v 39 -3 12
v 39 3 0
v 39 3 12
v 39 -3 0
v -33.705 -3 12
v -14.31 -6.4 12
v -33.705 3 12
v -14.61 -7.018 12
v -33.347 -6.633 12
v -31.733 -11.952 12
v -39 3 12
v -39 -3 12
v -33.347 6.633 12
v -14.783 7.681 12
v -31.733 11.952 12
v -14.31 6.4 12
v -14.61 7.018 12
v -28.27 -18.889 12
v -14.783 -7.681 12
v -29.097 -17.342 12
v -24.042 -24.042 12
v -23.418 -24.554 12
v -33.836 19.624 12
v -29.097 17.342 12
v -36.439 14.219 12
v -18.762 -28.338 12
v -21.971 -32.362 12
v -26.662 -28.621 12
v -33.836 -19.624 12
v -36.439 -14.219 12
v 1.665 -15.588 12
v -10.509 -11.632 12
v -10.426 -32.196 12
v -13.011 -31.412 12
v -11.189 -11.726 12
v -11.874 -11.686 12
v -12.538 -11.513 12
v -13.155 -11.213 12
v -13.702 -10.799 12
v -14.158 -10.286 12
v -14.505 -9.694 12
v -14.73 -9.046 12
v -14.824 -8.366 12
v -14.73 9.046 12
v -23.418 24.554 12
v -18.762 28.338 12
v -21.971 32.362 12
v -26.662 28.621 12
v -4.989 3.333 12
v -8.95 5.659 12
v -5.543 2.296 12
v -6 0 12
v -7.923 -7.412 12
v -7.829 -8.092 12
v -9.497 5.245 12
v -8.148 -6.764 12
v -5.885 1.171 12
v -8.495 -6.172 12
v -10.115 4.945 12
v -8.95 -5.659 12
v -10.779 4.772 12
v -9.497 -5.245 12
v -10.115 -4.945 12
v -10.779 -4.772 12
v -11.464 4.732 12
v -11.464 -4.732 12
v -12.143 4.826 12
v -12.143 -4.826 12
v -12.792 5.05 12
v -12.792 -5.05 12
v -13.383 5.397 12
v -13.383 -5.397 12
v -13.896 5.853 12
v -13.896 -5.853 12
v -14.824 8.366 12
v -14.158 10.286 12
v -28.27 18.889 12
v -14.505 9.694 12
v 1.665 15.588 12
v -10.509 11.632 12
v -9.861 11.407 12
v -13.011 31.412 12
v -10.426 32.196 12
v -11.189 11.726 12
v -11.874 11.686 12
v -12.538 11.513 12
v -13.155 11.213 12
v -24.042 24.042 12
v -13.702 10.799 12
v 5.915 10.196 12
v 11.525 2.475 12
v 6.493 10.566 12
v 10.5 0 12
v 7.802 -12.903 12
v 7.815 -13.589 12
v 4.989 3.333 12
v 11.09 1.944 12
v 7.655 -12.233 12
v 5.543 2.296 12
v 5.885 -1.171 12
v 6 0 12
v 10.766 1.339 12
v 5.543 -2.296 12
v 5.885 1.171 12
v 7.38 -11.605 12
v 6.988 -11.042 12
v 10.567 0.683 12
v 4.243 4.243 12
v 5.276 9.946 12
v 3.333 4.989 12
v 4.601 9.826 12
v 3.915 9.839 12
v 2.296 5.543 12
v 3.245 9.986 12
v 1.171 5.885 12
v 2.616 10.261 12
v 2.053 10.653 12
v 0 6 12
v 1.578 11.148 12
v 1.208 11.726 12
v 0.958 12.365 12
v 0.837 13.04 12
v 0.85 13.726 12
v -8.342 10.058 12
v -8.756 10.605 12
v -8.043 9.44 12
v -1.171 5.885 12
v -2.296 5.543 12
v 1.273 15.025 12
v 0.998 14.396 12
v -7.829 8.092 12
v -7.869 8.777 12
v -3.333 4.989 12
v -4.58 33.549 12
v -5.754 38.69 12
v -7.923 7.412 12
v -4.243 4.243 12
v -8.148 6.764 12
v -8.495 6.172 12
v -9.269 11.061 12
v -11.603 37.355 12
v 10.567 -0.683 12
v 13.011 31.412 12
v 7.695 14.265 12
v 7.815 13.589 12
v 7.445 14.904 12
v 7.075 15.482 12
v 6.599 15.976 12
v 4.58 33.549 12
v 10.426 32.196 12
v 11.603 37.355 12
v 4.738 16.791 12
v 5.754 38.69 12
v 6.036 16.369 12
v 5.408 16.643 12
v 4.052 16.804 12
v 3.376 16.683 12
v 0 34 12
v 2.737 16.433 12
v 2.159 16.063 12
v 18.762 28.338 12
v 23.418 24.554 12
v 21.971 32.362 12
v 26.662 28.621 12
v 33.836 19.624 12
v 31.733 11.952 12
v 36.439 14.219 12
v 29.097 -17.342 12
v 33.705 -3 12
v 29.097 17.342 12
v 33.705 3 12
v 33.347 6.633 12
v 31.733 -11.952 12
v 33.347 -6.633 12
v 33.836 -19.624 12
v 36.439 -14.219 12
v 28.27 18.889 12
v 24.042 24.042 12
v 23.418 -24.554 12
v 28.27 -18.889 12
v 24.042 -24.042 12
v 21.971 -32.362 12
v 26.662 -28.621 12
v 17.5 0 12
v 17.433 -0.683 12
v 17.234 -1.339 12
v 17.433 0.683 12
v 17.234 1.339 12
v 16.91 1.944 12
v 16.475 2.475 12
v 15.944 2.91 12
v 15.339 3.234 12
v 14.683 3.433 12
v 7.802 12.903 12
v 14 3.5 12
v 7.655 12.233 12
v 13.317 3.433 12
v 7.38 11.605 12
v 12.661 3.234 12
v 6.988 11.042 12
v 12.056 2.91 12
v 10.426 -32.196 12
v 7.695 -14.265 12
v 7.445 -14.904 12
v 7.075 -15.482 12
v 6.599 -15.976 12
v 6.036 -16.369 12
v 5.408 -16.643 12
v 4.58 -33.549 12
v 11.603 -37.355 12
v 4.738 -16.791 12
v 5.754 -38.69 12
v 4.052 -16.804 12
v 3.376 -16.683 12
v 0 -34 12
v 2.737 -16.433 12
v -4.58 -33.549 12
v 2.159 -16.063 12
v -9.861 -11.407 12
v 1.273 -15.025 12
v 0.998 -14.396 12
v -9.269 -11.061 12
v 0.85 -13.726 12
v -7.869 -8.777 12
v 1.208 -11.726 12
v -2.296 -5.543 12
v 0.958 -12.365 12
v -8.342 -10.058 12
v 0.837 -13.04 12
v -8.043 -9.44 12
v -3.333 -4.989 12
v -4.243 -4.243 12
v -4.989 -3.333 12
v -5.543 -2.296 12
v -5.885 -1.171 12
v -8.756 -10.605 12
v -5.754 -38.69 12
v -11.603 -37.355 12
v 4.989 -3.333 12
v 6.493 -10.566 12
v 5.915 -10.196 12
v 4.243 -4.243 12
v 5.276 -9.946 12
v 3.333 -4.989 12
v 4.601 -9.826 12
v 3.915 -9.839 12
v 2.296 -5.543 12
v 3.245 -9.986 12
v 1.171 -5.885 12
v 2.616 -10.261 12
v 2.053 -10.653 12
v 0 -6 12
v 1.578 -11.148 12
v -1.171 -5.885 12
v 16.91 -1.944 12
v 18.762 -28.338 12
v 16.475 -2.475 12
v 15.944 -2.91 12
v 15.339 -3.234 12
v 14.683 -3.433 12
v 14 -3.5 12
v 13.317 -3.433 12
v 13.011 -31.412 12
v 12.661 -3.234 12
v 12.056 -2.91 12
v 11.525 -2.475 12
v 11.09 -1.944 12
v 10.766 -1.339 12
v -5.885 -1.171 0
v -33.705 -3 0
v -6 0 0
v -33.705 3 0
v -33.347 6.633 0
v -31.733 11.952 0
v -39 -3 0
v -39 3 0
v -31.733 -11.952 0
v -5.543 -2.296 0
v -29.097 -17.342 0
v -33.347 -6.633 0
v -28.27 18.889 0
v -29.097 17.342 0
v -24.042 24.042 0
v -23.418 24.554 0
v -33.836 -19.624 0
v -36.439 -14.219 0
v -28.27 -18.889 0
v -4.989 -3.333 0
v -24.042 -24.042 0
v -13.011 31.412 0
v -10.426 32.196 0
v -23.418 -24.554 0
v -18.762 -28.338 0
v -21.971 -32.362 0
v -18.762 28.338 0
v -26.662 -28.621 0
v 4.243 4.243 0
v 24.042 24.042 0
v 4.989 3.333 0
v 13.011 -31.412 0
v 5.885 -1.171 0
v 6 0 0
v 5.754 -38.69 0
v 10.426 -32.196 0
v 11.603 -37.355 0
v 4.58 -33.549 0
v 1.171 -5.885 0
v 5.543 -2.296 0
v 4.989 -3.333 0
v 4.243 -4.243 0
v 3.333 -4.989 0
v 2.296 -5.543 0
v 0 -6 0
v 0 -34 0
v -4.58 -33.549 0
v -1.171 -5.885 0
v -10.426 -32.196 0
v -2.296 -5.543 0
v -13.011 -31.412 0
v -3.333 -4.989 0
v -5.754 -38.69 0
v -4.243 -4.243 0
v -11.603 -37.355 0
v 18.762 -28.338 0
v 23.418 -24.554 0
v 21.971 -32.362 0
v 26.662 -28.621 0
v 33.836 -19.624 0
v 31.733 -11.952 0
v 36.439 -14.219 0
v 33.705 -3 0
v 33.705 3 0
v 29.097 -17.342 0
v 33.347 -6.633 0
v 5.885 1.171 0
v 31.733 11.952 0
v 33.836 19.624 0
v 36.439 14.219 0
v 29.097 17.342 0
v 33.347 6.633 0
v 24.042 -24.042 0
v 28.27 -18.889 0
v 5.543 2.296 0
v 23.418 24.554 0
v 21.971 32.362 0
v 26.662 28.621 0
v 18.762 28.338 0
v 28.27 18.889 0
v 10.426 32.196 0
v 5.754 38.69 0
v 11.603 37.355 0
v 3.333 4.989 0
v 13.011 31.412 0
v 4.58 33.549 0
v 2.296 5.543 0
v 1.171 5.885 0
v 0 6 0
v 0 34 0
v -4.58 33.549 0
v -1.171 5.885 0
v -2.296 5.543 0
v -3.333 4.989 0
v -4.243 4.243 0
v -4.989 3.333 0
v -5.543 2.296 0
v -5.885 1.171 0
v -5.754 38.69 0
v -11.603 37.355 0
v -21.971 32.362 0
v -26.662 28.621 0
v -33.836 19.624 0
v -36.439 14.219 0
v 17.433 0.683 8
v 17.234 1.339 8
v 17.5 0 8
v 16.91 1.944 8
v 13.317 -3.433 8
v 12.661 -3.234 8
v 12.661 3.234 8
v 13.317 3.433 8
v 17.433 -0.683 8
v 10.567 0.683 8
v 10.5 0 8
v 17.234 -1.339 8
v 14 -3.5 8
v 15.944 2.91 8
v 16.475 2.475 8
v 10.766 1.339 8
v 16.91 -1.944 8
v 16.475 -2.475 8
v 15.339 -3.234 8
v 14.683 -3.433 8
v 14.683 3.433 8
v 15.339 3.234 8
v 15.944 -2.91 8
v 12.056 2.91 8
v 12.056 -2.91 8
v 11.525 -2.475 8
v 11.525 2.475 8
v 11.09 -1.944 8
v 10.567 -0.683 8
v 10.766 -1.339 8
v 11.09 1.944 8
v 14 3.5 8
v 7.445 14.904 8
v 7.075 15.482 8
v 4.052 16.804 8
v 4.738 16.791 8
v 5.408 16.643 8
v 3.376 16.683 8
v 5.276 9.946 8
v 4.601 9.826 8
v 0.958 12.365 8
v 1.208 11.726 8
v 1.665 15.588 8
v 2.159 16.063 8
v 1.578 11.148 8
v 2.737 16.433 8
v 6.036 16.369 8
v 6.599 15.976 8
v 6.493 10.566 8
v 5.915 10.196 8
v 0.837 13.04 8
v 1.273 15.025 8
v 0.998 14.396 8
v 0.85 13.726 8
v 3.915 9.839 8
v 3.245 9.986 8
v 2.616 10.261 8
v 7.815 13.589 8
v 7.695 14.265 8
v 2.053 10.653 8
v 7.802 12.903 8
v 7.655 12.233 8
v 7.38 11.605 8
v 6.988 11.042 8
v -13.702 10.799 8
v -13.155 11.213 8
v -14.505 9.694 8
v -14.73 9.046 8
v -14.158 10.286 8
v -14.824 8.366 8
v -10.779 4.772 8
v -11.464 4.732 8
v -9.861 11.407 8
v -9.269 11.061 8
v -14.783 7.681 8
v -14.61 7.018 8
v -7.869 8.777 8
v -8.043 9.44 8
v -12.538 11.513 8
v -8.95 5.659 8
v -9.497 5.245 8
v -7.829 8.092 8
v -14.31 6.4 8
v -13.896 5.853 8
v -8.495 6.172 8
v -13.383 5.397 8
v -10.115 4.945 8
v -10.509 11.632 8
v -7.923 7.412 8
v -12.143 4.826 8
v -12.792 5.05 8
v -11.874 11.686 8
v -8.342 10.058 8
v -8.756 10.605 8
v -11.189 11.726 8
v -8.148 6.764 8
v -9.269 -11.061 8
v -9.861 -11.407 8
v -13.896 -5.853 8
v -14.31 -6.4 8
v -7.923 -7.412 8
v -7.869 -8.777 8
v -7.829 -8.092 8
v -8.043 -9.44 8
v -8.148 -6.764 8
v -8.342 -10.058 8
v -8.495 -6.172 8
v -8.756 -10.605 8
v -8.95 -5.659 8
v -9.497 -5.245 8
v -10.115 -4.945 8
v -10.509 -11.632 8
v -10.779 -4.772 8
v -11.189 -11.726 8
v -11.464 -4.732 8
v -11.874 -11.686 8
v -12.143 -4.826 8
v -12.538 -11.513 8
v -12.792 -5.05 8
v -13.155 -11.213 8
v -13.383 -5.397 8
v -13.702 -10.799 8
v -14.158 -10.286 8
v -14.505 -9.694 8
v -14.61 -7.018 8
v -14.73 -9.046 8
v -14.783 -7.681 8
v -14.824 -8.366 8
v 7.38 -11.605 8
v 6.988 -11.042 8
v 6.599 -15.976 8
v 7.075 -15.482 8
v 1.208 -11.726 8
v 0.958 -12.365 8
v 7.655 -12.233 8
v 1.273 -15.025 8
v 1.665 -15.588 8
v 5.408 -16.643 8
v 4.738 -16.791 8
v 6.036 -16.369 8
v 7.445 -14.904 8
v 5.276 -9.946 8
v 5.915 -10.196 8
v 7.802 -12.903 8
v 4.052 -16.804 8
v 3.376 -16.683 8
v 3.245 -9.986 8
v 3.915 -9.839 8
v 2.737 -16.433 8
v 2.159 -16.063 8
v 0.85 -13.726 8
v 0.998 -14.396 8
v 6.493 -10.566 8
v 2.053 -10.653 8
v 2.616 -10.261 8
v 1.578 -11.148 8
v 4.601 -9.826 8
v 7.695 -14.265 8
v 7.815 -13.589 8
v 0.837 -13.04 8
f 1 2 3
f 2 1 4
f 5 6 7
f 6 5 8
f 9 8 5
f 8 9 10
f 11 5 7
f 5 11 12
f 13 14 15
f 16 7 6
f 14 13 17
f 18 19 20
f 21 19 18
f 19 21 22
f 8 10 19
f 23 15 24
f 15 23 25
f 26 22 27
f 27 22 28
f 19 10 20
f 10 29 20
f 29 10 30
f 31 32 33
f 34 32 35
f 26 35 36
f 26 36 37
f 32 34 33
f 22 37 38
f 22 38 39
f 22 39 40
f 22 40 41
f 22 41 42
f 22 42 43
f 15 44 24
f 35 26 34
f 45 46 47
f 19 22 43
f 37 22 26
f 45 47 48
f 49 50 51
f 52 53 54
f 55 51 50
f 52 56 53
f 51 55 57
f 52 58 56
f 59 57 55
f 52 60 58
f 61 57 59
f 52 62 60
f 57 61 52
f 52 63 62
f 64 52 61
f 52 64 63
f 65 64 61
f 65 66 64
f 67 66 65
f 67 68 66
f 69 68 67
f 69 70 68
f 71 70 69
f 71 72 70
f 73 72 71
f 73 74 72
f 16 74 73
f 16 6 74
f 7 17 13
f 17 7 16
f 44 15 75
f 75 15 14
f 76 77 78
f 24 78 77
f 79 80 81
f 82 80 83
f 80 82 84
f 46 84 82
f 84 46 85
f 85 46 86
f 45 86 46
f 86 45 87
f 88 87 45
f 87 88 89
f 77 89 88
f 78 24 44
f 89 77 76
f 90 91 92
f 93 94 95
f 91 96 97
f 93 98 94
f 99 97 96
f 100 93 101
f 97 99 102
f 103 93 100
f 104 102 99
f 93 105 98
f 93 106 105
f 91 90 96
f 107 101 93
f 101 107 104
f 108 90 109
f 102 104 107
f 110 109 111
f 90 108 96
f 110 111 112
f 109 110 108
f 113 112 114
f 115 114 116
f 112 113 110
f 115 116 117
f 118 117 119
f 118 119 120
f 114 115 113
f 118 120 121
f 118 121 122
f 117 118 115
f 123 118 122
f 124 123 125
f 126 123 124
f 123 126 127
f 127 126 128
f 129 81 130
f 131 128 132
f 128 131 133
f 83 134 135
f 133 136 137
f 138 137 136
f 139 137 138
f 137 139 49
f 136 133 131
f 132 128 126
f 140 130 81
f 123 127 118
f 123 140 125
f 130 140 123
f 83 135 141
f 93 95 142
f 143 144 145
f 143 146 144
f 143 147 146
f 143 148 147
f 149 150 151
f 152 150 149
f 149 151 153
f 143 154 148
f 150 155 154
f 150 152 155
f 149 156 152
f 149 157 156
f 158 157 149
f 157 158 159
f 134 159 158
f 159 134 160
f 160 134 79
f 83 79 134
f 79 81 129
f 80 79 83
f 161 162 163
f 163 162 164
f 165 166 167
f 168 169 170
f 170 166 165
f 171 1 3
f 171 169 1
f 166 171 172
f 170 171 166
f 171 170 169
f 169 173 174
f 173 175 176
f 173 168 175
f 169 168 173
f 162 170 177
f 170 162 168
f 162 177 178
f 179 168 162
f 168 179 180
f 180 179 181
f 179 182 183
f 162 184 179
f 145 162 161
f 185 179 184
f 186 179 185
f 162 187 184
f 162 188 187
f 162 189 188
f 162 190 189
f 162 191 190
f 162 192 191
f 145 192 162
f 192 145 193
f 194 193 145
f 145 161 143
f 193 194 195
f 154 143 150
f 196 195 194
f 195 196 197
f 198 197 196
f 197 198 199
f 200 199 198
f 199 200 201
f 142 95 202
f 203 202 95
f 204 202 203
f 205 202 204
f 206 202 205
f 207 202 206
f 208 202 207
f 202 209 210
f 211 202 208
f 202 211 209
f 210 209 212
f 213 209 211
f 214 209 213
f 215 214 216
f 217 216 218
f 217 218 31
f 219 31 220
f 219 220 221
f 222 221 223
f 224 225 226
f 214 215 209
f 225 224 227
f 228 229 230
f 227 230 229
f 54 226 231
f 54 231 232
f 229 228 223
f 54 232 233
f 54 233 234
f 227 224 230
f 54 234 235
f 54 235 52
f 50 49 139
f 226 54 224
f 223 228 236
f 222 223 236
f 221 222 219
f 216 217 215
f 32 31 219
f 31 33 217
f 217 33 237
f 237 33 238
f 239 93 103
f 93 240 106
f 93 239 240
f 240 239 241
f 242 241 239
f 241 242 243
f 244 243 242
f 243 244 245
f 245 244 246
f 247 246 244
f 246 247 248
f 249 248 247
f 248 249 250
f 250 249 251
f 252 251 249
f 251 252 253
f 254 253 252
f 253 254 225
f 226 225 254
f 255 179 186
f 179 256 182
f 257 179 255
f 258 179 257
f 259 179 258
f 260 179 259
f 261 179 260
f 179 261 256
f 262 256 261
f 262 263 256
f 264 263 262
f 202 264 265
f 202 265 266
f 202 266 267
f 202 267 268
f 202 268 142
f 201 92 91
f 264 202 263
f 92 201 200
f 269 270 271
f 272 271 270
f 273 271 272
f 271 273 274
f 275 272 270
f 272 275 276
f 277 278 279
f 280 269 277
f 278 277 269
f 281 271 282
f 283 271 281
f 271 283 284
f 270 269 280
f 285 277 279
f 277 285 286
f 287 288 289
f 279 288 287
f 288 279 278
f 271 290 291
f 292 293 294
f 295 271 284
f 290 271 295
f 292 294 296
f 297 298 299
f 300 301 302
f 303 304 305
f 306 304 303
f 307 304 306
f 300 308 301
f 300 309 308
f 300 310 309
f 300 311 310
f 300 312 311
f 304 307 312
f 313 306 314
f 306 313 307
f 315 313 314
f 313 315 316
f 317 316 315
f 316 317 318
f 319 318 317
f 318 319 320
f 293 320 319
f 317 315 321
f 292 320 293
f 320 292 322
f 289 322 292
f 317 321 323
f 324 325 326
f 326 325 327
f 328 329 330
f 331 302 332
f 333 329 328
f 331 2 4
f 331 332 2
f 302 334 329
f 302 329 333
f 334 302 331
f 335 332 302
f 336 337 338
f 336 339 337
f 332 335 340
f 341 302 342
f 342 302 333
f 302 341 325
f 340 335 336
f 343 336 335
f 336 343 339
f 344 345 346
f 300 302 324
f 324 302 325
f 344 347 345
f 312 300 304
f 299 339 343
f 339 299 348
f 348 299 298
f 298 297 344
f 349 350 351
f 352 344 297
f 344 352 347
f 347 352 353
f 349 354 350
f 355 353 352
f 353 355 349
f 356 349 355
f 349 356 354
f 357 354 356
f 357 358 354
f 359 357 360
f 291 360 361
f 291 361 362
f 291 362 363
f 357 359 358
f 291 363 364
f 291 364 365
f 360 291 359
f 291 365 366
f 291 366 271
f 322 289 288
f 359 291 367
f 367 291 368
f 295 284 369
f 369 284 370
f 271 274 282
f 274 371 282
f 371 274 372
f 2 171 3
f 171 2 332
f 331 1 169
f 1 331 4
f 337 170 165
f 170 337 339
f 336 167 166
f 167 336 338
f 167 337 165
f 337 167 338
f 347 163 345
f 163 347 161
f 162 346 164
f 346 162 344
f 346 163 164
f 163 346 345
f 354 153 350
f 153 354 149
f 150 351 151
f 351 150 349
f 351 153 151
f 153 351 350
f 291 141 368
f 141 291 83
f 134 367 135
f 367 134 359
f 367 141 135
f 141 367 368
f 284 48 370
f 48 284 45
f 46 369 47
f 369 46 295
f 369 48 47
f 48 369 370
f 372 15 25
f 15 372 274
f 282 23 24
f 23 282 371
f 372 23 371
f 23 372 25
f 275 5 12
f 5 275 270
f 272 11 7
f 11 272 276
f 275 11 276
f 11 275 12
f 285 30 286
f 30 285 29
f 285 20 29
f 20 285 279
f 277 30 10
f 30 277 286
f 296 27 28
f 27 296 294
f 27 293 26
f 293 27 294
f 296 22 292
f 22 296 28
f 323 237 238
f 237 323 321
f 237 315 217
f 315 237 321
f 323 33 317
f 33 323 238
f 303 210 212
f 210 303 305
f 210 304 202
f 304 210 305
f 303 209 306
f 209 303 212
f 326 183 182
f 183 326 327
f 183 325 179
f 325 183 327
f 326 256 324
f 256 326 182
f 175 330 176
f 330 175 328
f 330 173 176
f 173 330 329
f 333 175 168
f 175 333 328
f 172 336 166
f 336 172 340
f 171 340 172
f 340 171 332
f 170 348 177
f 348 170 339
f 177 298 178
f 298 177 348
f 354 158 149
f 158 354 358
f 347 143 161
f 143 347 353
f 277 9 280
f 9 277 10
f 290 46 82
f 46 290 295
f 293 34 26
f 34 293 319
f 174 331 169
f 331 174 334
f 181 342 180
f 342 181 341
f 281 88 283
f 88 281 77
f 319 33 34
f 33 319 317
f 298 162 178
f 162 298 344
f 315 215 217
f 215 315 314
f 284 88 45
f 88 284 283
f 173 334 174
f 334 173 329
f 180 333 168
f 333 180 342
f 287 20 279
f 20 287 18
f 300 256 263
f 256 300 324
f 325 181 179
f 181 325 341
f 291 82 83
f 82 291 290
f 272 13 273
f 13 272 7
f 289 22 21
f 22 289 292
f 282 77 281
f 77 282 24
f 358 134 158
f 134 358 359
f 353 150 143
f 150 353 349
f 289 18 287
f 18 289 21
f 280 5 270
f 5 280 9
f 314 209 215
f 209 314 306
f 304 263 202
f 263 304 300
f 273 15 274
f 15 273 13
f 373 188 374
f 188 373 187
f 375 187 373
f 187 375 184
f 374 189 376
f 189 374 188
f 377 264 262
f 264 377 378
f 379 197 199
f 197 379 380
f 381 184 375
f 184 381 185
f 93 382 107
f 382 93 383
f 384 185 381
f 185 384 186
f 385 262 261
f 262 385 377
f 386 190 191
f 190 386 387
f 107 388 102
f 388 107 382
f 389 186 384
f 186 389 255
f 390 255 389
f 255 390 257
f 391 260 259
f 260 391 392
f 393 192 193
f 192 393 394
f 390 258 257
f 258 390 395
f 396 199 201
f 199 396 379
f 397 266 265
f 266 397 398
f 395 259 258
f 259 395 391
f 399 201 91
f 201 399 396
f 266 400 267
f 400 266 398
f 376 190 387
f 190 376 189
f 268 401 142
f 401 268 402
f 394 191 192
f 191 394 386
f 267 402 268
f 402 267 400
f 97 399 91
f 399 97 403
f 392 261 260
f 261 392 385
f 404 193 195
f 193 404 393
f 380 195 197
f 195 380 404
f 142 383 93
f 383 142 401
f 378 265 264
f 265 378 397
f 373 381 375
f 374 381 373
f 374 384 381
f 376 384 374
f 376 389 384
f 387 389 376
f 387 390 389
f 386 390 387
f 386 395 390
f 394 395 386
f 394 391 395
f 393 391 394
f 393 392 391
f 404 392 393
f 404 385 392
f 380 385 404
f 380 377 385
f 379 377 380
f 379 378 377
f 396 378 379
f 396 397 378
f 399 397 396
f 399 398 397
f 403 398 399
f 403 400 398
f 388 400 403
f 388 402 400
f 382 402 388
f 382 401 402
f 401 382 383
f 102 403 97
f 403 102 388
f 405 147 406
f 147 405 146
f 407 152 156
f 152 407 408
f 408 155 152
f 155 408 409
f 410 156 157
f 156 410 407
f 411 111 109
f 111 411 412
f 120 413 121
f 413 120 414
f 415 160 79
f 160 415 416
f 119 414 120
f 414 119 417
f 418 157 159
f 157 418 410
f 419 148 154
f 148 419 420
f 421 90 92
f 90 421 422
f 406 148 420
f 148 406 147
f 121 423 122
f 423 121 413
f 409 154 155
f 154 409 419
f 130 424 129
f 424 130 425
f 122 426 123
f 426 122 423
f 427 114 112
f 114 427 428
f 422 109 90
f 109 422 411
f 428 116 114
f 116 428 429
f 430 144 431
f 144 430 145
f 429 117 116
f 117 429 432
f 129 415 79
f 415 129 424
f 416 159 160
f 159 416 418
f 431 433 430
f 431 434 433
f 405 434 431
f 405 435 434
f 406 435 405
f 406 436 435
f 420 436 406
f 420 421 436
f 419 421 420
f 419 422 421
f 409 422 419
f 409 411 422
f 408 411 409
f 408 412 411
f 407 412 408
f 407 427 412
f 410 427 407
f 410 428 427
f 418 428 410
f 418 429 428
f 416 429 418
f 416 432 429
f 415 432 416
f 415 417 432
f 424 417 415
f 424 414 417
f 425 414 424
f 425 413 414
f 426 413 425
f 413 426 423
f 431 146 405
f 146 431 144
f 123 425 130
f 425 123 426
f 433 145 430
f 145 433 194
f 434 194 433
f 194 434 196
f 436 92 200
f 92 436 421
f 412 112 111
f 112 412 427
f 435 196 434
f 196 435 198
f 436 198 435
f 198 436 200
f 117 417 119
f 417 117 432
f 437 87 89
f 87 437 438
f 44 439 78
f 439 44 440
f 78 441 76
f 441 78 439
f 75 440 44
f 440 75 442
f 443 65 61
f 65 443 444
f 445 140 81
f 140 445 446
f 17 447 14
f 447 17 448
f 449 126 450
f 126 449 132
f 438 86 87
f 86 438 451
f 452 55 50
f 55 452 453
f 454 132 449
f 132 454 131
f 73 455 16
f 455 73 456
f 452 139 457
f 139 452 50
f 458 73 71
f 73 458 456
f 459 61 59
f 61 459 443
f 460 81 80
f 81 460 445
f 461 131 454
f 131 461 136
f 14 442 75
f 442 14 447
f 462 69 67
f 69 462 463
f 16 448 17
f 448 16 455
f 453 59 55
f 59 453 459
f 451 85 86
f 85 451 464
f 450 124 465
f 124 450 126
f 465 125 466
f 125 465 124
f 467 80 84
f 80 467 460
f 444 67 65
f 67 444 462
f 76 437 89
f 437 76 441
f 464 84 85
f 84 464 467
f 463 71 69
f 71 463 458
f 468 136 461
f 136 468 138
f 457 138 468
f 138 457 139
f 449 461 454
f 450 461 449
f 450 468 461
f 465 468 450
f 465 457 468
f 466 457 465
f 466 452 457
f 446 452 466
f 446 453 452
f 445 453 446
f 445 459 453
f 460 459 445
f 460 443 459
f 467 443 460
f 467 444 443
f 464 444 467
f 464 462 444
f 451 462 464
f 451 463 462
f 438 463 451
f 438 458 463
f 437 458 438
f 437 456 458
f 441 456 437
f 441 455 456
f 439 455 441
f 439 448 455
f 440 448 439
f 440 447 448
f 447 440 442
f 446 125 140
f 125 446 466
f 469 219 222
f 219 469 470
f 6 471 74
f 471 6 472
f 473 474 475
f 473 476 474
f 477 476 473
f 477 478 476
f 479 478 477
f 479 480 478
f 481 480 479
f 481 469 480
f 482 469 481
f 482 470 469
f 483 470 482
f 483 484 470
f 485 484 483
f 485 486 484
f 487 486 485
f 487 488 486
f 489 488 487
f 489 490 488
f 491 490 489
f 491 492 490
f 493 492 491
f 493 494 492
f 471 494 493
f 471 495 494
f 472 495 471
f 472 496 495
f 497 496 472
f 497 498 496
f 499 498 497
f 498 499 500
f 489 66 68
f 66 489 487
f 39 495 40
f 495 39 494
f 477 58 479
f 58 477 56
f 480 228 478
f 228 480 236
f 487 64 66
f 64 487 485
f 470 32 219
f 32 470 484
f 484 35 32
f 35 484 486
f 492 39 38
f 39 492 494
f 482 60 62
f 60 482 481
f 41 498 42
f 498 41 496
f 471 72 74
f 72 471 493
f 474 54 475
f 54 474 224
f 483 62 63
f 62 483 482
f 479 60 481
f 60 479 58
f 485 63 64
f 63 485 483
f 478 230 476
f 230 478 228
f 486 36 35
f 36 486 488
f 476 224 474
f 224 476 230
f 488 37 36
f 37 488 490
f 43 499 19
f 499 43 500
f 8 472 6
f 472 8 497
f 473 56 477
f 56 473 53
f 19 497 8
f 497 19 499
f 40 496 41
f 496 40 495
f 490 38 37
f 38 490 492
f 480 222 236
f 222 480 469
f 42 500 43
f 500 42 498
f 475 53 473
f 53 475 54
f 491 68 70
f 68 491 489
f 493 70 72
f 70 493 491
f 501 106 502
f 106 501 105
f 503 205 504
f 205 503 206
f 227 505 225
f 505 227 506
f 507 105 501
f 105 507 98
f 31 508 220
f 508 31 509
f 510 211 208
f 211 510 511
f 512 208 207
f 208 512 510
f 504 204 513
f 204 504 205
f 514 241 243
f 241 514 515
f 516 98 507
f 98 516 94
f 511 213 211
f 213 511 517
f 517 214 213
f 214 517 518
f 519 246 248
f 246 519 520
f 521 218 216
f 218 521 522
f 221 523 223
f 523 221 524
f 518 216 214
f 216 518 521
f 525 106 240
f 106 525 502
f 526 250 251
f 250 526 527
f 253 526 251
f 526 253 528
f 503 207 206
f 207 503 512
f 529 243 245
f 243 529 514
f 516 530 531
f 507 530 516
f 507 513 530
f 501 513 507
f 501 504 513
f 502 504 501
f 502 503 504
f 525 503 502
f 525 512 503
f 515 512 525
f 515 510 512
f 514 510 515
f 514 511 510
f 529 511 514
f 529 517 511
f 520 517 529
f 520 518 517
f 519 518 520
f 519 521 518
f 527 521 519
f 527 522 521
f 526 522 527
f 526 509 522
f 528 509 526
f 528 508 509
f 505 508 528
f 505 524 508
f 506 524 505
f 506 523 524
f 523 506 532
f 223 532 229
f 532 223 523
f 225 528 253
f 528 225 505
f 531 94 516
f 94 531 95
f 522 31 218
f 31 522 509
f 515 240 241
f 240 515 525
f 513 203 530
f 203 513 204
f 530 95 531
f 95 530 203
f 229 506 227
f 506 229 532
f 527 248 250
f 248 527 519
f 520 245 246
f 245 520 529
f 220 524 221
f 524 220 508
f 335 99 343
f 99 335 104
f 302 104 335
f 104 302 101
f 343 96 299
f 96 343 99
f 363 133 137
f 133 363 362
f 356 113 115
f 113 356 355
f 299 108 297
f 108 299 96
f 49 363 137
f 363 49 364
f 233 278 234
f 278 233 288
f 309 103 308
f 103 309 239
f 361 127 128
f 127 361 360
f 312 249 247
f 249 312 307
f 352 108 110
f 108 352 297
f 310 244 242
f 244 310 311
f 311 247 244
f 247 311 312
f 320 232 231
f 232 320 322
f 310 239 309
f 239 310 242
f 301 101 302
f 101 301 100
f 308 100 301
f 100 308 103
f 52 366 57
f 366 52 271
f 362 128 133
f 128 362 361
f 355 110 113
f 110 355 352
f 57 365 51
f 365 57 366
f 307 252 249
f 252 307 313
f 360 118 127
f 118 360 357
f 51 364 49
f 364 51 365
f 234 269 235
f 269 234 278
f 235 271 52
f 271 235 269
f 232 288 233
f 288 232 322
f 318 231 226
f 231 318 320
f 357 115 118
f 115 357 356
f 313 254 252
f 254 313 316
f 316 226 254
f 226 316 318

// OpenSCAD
$fn = 32;

// ----------------------------------------------------------------------
// Spur blank: lightened gear blank
// ----------------------------------------------------------------------

// --- parameters (mm) ---
disc_r = 34;              // blank root radius
disc_t = 12;              // blank thickness
n_teeth = 14;             // stub tooth count
tooth_w = 6;              // tooth width at the root
tooth_h = 5;              // tooth height above the root
bore_r = 6;               // central bore radius
ring_r = 14;              // lightening pocket ring radius
pocket_r = 3.5;           // lightening pocket radius

out_r = disc_r + tooth_h;  // tip radius
bbox_x = 78.0;  // measured width over the teeth
bbox_y = 77.38;  // measured depth over the teeth

difference() {
union() {
  cylinder(r = disc_r, h = disc_t);
  for (i = [0 : n_teeth - 1])
    rotate([0, 0, i * 360 / n_teeth])
      translate([disc_r - 1, -tooth_w / 2, 0])
        cube([tooth_h + 1, tooth_w, disc_t]);
}
  translate([0, 0, -1]) cylinder(r = bore_r, h = disc_t + 2);
  for (i = [0 : 5])
    rotate([0, 0, i * 72])
      translate([ring_r, 0, disc_t - 4])
        cylinder(r = pocket_r, h = 5);
}
